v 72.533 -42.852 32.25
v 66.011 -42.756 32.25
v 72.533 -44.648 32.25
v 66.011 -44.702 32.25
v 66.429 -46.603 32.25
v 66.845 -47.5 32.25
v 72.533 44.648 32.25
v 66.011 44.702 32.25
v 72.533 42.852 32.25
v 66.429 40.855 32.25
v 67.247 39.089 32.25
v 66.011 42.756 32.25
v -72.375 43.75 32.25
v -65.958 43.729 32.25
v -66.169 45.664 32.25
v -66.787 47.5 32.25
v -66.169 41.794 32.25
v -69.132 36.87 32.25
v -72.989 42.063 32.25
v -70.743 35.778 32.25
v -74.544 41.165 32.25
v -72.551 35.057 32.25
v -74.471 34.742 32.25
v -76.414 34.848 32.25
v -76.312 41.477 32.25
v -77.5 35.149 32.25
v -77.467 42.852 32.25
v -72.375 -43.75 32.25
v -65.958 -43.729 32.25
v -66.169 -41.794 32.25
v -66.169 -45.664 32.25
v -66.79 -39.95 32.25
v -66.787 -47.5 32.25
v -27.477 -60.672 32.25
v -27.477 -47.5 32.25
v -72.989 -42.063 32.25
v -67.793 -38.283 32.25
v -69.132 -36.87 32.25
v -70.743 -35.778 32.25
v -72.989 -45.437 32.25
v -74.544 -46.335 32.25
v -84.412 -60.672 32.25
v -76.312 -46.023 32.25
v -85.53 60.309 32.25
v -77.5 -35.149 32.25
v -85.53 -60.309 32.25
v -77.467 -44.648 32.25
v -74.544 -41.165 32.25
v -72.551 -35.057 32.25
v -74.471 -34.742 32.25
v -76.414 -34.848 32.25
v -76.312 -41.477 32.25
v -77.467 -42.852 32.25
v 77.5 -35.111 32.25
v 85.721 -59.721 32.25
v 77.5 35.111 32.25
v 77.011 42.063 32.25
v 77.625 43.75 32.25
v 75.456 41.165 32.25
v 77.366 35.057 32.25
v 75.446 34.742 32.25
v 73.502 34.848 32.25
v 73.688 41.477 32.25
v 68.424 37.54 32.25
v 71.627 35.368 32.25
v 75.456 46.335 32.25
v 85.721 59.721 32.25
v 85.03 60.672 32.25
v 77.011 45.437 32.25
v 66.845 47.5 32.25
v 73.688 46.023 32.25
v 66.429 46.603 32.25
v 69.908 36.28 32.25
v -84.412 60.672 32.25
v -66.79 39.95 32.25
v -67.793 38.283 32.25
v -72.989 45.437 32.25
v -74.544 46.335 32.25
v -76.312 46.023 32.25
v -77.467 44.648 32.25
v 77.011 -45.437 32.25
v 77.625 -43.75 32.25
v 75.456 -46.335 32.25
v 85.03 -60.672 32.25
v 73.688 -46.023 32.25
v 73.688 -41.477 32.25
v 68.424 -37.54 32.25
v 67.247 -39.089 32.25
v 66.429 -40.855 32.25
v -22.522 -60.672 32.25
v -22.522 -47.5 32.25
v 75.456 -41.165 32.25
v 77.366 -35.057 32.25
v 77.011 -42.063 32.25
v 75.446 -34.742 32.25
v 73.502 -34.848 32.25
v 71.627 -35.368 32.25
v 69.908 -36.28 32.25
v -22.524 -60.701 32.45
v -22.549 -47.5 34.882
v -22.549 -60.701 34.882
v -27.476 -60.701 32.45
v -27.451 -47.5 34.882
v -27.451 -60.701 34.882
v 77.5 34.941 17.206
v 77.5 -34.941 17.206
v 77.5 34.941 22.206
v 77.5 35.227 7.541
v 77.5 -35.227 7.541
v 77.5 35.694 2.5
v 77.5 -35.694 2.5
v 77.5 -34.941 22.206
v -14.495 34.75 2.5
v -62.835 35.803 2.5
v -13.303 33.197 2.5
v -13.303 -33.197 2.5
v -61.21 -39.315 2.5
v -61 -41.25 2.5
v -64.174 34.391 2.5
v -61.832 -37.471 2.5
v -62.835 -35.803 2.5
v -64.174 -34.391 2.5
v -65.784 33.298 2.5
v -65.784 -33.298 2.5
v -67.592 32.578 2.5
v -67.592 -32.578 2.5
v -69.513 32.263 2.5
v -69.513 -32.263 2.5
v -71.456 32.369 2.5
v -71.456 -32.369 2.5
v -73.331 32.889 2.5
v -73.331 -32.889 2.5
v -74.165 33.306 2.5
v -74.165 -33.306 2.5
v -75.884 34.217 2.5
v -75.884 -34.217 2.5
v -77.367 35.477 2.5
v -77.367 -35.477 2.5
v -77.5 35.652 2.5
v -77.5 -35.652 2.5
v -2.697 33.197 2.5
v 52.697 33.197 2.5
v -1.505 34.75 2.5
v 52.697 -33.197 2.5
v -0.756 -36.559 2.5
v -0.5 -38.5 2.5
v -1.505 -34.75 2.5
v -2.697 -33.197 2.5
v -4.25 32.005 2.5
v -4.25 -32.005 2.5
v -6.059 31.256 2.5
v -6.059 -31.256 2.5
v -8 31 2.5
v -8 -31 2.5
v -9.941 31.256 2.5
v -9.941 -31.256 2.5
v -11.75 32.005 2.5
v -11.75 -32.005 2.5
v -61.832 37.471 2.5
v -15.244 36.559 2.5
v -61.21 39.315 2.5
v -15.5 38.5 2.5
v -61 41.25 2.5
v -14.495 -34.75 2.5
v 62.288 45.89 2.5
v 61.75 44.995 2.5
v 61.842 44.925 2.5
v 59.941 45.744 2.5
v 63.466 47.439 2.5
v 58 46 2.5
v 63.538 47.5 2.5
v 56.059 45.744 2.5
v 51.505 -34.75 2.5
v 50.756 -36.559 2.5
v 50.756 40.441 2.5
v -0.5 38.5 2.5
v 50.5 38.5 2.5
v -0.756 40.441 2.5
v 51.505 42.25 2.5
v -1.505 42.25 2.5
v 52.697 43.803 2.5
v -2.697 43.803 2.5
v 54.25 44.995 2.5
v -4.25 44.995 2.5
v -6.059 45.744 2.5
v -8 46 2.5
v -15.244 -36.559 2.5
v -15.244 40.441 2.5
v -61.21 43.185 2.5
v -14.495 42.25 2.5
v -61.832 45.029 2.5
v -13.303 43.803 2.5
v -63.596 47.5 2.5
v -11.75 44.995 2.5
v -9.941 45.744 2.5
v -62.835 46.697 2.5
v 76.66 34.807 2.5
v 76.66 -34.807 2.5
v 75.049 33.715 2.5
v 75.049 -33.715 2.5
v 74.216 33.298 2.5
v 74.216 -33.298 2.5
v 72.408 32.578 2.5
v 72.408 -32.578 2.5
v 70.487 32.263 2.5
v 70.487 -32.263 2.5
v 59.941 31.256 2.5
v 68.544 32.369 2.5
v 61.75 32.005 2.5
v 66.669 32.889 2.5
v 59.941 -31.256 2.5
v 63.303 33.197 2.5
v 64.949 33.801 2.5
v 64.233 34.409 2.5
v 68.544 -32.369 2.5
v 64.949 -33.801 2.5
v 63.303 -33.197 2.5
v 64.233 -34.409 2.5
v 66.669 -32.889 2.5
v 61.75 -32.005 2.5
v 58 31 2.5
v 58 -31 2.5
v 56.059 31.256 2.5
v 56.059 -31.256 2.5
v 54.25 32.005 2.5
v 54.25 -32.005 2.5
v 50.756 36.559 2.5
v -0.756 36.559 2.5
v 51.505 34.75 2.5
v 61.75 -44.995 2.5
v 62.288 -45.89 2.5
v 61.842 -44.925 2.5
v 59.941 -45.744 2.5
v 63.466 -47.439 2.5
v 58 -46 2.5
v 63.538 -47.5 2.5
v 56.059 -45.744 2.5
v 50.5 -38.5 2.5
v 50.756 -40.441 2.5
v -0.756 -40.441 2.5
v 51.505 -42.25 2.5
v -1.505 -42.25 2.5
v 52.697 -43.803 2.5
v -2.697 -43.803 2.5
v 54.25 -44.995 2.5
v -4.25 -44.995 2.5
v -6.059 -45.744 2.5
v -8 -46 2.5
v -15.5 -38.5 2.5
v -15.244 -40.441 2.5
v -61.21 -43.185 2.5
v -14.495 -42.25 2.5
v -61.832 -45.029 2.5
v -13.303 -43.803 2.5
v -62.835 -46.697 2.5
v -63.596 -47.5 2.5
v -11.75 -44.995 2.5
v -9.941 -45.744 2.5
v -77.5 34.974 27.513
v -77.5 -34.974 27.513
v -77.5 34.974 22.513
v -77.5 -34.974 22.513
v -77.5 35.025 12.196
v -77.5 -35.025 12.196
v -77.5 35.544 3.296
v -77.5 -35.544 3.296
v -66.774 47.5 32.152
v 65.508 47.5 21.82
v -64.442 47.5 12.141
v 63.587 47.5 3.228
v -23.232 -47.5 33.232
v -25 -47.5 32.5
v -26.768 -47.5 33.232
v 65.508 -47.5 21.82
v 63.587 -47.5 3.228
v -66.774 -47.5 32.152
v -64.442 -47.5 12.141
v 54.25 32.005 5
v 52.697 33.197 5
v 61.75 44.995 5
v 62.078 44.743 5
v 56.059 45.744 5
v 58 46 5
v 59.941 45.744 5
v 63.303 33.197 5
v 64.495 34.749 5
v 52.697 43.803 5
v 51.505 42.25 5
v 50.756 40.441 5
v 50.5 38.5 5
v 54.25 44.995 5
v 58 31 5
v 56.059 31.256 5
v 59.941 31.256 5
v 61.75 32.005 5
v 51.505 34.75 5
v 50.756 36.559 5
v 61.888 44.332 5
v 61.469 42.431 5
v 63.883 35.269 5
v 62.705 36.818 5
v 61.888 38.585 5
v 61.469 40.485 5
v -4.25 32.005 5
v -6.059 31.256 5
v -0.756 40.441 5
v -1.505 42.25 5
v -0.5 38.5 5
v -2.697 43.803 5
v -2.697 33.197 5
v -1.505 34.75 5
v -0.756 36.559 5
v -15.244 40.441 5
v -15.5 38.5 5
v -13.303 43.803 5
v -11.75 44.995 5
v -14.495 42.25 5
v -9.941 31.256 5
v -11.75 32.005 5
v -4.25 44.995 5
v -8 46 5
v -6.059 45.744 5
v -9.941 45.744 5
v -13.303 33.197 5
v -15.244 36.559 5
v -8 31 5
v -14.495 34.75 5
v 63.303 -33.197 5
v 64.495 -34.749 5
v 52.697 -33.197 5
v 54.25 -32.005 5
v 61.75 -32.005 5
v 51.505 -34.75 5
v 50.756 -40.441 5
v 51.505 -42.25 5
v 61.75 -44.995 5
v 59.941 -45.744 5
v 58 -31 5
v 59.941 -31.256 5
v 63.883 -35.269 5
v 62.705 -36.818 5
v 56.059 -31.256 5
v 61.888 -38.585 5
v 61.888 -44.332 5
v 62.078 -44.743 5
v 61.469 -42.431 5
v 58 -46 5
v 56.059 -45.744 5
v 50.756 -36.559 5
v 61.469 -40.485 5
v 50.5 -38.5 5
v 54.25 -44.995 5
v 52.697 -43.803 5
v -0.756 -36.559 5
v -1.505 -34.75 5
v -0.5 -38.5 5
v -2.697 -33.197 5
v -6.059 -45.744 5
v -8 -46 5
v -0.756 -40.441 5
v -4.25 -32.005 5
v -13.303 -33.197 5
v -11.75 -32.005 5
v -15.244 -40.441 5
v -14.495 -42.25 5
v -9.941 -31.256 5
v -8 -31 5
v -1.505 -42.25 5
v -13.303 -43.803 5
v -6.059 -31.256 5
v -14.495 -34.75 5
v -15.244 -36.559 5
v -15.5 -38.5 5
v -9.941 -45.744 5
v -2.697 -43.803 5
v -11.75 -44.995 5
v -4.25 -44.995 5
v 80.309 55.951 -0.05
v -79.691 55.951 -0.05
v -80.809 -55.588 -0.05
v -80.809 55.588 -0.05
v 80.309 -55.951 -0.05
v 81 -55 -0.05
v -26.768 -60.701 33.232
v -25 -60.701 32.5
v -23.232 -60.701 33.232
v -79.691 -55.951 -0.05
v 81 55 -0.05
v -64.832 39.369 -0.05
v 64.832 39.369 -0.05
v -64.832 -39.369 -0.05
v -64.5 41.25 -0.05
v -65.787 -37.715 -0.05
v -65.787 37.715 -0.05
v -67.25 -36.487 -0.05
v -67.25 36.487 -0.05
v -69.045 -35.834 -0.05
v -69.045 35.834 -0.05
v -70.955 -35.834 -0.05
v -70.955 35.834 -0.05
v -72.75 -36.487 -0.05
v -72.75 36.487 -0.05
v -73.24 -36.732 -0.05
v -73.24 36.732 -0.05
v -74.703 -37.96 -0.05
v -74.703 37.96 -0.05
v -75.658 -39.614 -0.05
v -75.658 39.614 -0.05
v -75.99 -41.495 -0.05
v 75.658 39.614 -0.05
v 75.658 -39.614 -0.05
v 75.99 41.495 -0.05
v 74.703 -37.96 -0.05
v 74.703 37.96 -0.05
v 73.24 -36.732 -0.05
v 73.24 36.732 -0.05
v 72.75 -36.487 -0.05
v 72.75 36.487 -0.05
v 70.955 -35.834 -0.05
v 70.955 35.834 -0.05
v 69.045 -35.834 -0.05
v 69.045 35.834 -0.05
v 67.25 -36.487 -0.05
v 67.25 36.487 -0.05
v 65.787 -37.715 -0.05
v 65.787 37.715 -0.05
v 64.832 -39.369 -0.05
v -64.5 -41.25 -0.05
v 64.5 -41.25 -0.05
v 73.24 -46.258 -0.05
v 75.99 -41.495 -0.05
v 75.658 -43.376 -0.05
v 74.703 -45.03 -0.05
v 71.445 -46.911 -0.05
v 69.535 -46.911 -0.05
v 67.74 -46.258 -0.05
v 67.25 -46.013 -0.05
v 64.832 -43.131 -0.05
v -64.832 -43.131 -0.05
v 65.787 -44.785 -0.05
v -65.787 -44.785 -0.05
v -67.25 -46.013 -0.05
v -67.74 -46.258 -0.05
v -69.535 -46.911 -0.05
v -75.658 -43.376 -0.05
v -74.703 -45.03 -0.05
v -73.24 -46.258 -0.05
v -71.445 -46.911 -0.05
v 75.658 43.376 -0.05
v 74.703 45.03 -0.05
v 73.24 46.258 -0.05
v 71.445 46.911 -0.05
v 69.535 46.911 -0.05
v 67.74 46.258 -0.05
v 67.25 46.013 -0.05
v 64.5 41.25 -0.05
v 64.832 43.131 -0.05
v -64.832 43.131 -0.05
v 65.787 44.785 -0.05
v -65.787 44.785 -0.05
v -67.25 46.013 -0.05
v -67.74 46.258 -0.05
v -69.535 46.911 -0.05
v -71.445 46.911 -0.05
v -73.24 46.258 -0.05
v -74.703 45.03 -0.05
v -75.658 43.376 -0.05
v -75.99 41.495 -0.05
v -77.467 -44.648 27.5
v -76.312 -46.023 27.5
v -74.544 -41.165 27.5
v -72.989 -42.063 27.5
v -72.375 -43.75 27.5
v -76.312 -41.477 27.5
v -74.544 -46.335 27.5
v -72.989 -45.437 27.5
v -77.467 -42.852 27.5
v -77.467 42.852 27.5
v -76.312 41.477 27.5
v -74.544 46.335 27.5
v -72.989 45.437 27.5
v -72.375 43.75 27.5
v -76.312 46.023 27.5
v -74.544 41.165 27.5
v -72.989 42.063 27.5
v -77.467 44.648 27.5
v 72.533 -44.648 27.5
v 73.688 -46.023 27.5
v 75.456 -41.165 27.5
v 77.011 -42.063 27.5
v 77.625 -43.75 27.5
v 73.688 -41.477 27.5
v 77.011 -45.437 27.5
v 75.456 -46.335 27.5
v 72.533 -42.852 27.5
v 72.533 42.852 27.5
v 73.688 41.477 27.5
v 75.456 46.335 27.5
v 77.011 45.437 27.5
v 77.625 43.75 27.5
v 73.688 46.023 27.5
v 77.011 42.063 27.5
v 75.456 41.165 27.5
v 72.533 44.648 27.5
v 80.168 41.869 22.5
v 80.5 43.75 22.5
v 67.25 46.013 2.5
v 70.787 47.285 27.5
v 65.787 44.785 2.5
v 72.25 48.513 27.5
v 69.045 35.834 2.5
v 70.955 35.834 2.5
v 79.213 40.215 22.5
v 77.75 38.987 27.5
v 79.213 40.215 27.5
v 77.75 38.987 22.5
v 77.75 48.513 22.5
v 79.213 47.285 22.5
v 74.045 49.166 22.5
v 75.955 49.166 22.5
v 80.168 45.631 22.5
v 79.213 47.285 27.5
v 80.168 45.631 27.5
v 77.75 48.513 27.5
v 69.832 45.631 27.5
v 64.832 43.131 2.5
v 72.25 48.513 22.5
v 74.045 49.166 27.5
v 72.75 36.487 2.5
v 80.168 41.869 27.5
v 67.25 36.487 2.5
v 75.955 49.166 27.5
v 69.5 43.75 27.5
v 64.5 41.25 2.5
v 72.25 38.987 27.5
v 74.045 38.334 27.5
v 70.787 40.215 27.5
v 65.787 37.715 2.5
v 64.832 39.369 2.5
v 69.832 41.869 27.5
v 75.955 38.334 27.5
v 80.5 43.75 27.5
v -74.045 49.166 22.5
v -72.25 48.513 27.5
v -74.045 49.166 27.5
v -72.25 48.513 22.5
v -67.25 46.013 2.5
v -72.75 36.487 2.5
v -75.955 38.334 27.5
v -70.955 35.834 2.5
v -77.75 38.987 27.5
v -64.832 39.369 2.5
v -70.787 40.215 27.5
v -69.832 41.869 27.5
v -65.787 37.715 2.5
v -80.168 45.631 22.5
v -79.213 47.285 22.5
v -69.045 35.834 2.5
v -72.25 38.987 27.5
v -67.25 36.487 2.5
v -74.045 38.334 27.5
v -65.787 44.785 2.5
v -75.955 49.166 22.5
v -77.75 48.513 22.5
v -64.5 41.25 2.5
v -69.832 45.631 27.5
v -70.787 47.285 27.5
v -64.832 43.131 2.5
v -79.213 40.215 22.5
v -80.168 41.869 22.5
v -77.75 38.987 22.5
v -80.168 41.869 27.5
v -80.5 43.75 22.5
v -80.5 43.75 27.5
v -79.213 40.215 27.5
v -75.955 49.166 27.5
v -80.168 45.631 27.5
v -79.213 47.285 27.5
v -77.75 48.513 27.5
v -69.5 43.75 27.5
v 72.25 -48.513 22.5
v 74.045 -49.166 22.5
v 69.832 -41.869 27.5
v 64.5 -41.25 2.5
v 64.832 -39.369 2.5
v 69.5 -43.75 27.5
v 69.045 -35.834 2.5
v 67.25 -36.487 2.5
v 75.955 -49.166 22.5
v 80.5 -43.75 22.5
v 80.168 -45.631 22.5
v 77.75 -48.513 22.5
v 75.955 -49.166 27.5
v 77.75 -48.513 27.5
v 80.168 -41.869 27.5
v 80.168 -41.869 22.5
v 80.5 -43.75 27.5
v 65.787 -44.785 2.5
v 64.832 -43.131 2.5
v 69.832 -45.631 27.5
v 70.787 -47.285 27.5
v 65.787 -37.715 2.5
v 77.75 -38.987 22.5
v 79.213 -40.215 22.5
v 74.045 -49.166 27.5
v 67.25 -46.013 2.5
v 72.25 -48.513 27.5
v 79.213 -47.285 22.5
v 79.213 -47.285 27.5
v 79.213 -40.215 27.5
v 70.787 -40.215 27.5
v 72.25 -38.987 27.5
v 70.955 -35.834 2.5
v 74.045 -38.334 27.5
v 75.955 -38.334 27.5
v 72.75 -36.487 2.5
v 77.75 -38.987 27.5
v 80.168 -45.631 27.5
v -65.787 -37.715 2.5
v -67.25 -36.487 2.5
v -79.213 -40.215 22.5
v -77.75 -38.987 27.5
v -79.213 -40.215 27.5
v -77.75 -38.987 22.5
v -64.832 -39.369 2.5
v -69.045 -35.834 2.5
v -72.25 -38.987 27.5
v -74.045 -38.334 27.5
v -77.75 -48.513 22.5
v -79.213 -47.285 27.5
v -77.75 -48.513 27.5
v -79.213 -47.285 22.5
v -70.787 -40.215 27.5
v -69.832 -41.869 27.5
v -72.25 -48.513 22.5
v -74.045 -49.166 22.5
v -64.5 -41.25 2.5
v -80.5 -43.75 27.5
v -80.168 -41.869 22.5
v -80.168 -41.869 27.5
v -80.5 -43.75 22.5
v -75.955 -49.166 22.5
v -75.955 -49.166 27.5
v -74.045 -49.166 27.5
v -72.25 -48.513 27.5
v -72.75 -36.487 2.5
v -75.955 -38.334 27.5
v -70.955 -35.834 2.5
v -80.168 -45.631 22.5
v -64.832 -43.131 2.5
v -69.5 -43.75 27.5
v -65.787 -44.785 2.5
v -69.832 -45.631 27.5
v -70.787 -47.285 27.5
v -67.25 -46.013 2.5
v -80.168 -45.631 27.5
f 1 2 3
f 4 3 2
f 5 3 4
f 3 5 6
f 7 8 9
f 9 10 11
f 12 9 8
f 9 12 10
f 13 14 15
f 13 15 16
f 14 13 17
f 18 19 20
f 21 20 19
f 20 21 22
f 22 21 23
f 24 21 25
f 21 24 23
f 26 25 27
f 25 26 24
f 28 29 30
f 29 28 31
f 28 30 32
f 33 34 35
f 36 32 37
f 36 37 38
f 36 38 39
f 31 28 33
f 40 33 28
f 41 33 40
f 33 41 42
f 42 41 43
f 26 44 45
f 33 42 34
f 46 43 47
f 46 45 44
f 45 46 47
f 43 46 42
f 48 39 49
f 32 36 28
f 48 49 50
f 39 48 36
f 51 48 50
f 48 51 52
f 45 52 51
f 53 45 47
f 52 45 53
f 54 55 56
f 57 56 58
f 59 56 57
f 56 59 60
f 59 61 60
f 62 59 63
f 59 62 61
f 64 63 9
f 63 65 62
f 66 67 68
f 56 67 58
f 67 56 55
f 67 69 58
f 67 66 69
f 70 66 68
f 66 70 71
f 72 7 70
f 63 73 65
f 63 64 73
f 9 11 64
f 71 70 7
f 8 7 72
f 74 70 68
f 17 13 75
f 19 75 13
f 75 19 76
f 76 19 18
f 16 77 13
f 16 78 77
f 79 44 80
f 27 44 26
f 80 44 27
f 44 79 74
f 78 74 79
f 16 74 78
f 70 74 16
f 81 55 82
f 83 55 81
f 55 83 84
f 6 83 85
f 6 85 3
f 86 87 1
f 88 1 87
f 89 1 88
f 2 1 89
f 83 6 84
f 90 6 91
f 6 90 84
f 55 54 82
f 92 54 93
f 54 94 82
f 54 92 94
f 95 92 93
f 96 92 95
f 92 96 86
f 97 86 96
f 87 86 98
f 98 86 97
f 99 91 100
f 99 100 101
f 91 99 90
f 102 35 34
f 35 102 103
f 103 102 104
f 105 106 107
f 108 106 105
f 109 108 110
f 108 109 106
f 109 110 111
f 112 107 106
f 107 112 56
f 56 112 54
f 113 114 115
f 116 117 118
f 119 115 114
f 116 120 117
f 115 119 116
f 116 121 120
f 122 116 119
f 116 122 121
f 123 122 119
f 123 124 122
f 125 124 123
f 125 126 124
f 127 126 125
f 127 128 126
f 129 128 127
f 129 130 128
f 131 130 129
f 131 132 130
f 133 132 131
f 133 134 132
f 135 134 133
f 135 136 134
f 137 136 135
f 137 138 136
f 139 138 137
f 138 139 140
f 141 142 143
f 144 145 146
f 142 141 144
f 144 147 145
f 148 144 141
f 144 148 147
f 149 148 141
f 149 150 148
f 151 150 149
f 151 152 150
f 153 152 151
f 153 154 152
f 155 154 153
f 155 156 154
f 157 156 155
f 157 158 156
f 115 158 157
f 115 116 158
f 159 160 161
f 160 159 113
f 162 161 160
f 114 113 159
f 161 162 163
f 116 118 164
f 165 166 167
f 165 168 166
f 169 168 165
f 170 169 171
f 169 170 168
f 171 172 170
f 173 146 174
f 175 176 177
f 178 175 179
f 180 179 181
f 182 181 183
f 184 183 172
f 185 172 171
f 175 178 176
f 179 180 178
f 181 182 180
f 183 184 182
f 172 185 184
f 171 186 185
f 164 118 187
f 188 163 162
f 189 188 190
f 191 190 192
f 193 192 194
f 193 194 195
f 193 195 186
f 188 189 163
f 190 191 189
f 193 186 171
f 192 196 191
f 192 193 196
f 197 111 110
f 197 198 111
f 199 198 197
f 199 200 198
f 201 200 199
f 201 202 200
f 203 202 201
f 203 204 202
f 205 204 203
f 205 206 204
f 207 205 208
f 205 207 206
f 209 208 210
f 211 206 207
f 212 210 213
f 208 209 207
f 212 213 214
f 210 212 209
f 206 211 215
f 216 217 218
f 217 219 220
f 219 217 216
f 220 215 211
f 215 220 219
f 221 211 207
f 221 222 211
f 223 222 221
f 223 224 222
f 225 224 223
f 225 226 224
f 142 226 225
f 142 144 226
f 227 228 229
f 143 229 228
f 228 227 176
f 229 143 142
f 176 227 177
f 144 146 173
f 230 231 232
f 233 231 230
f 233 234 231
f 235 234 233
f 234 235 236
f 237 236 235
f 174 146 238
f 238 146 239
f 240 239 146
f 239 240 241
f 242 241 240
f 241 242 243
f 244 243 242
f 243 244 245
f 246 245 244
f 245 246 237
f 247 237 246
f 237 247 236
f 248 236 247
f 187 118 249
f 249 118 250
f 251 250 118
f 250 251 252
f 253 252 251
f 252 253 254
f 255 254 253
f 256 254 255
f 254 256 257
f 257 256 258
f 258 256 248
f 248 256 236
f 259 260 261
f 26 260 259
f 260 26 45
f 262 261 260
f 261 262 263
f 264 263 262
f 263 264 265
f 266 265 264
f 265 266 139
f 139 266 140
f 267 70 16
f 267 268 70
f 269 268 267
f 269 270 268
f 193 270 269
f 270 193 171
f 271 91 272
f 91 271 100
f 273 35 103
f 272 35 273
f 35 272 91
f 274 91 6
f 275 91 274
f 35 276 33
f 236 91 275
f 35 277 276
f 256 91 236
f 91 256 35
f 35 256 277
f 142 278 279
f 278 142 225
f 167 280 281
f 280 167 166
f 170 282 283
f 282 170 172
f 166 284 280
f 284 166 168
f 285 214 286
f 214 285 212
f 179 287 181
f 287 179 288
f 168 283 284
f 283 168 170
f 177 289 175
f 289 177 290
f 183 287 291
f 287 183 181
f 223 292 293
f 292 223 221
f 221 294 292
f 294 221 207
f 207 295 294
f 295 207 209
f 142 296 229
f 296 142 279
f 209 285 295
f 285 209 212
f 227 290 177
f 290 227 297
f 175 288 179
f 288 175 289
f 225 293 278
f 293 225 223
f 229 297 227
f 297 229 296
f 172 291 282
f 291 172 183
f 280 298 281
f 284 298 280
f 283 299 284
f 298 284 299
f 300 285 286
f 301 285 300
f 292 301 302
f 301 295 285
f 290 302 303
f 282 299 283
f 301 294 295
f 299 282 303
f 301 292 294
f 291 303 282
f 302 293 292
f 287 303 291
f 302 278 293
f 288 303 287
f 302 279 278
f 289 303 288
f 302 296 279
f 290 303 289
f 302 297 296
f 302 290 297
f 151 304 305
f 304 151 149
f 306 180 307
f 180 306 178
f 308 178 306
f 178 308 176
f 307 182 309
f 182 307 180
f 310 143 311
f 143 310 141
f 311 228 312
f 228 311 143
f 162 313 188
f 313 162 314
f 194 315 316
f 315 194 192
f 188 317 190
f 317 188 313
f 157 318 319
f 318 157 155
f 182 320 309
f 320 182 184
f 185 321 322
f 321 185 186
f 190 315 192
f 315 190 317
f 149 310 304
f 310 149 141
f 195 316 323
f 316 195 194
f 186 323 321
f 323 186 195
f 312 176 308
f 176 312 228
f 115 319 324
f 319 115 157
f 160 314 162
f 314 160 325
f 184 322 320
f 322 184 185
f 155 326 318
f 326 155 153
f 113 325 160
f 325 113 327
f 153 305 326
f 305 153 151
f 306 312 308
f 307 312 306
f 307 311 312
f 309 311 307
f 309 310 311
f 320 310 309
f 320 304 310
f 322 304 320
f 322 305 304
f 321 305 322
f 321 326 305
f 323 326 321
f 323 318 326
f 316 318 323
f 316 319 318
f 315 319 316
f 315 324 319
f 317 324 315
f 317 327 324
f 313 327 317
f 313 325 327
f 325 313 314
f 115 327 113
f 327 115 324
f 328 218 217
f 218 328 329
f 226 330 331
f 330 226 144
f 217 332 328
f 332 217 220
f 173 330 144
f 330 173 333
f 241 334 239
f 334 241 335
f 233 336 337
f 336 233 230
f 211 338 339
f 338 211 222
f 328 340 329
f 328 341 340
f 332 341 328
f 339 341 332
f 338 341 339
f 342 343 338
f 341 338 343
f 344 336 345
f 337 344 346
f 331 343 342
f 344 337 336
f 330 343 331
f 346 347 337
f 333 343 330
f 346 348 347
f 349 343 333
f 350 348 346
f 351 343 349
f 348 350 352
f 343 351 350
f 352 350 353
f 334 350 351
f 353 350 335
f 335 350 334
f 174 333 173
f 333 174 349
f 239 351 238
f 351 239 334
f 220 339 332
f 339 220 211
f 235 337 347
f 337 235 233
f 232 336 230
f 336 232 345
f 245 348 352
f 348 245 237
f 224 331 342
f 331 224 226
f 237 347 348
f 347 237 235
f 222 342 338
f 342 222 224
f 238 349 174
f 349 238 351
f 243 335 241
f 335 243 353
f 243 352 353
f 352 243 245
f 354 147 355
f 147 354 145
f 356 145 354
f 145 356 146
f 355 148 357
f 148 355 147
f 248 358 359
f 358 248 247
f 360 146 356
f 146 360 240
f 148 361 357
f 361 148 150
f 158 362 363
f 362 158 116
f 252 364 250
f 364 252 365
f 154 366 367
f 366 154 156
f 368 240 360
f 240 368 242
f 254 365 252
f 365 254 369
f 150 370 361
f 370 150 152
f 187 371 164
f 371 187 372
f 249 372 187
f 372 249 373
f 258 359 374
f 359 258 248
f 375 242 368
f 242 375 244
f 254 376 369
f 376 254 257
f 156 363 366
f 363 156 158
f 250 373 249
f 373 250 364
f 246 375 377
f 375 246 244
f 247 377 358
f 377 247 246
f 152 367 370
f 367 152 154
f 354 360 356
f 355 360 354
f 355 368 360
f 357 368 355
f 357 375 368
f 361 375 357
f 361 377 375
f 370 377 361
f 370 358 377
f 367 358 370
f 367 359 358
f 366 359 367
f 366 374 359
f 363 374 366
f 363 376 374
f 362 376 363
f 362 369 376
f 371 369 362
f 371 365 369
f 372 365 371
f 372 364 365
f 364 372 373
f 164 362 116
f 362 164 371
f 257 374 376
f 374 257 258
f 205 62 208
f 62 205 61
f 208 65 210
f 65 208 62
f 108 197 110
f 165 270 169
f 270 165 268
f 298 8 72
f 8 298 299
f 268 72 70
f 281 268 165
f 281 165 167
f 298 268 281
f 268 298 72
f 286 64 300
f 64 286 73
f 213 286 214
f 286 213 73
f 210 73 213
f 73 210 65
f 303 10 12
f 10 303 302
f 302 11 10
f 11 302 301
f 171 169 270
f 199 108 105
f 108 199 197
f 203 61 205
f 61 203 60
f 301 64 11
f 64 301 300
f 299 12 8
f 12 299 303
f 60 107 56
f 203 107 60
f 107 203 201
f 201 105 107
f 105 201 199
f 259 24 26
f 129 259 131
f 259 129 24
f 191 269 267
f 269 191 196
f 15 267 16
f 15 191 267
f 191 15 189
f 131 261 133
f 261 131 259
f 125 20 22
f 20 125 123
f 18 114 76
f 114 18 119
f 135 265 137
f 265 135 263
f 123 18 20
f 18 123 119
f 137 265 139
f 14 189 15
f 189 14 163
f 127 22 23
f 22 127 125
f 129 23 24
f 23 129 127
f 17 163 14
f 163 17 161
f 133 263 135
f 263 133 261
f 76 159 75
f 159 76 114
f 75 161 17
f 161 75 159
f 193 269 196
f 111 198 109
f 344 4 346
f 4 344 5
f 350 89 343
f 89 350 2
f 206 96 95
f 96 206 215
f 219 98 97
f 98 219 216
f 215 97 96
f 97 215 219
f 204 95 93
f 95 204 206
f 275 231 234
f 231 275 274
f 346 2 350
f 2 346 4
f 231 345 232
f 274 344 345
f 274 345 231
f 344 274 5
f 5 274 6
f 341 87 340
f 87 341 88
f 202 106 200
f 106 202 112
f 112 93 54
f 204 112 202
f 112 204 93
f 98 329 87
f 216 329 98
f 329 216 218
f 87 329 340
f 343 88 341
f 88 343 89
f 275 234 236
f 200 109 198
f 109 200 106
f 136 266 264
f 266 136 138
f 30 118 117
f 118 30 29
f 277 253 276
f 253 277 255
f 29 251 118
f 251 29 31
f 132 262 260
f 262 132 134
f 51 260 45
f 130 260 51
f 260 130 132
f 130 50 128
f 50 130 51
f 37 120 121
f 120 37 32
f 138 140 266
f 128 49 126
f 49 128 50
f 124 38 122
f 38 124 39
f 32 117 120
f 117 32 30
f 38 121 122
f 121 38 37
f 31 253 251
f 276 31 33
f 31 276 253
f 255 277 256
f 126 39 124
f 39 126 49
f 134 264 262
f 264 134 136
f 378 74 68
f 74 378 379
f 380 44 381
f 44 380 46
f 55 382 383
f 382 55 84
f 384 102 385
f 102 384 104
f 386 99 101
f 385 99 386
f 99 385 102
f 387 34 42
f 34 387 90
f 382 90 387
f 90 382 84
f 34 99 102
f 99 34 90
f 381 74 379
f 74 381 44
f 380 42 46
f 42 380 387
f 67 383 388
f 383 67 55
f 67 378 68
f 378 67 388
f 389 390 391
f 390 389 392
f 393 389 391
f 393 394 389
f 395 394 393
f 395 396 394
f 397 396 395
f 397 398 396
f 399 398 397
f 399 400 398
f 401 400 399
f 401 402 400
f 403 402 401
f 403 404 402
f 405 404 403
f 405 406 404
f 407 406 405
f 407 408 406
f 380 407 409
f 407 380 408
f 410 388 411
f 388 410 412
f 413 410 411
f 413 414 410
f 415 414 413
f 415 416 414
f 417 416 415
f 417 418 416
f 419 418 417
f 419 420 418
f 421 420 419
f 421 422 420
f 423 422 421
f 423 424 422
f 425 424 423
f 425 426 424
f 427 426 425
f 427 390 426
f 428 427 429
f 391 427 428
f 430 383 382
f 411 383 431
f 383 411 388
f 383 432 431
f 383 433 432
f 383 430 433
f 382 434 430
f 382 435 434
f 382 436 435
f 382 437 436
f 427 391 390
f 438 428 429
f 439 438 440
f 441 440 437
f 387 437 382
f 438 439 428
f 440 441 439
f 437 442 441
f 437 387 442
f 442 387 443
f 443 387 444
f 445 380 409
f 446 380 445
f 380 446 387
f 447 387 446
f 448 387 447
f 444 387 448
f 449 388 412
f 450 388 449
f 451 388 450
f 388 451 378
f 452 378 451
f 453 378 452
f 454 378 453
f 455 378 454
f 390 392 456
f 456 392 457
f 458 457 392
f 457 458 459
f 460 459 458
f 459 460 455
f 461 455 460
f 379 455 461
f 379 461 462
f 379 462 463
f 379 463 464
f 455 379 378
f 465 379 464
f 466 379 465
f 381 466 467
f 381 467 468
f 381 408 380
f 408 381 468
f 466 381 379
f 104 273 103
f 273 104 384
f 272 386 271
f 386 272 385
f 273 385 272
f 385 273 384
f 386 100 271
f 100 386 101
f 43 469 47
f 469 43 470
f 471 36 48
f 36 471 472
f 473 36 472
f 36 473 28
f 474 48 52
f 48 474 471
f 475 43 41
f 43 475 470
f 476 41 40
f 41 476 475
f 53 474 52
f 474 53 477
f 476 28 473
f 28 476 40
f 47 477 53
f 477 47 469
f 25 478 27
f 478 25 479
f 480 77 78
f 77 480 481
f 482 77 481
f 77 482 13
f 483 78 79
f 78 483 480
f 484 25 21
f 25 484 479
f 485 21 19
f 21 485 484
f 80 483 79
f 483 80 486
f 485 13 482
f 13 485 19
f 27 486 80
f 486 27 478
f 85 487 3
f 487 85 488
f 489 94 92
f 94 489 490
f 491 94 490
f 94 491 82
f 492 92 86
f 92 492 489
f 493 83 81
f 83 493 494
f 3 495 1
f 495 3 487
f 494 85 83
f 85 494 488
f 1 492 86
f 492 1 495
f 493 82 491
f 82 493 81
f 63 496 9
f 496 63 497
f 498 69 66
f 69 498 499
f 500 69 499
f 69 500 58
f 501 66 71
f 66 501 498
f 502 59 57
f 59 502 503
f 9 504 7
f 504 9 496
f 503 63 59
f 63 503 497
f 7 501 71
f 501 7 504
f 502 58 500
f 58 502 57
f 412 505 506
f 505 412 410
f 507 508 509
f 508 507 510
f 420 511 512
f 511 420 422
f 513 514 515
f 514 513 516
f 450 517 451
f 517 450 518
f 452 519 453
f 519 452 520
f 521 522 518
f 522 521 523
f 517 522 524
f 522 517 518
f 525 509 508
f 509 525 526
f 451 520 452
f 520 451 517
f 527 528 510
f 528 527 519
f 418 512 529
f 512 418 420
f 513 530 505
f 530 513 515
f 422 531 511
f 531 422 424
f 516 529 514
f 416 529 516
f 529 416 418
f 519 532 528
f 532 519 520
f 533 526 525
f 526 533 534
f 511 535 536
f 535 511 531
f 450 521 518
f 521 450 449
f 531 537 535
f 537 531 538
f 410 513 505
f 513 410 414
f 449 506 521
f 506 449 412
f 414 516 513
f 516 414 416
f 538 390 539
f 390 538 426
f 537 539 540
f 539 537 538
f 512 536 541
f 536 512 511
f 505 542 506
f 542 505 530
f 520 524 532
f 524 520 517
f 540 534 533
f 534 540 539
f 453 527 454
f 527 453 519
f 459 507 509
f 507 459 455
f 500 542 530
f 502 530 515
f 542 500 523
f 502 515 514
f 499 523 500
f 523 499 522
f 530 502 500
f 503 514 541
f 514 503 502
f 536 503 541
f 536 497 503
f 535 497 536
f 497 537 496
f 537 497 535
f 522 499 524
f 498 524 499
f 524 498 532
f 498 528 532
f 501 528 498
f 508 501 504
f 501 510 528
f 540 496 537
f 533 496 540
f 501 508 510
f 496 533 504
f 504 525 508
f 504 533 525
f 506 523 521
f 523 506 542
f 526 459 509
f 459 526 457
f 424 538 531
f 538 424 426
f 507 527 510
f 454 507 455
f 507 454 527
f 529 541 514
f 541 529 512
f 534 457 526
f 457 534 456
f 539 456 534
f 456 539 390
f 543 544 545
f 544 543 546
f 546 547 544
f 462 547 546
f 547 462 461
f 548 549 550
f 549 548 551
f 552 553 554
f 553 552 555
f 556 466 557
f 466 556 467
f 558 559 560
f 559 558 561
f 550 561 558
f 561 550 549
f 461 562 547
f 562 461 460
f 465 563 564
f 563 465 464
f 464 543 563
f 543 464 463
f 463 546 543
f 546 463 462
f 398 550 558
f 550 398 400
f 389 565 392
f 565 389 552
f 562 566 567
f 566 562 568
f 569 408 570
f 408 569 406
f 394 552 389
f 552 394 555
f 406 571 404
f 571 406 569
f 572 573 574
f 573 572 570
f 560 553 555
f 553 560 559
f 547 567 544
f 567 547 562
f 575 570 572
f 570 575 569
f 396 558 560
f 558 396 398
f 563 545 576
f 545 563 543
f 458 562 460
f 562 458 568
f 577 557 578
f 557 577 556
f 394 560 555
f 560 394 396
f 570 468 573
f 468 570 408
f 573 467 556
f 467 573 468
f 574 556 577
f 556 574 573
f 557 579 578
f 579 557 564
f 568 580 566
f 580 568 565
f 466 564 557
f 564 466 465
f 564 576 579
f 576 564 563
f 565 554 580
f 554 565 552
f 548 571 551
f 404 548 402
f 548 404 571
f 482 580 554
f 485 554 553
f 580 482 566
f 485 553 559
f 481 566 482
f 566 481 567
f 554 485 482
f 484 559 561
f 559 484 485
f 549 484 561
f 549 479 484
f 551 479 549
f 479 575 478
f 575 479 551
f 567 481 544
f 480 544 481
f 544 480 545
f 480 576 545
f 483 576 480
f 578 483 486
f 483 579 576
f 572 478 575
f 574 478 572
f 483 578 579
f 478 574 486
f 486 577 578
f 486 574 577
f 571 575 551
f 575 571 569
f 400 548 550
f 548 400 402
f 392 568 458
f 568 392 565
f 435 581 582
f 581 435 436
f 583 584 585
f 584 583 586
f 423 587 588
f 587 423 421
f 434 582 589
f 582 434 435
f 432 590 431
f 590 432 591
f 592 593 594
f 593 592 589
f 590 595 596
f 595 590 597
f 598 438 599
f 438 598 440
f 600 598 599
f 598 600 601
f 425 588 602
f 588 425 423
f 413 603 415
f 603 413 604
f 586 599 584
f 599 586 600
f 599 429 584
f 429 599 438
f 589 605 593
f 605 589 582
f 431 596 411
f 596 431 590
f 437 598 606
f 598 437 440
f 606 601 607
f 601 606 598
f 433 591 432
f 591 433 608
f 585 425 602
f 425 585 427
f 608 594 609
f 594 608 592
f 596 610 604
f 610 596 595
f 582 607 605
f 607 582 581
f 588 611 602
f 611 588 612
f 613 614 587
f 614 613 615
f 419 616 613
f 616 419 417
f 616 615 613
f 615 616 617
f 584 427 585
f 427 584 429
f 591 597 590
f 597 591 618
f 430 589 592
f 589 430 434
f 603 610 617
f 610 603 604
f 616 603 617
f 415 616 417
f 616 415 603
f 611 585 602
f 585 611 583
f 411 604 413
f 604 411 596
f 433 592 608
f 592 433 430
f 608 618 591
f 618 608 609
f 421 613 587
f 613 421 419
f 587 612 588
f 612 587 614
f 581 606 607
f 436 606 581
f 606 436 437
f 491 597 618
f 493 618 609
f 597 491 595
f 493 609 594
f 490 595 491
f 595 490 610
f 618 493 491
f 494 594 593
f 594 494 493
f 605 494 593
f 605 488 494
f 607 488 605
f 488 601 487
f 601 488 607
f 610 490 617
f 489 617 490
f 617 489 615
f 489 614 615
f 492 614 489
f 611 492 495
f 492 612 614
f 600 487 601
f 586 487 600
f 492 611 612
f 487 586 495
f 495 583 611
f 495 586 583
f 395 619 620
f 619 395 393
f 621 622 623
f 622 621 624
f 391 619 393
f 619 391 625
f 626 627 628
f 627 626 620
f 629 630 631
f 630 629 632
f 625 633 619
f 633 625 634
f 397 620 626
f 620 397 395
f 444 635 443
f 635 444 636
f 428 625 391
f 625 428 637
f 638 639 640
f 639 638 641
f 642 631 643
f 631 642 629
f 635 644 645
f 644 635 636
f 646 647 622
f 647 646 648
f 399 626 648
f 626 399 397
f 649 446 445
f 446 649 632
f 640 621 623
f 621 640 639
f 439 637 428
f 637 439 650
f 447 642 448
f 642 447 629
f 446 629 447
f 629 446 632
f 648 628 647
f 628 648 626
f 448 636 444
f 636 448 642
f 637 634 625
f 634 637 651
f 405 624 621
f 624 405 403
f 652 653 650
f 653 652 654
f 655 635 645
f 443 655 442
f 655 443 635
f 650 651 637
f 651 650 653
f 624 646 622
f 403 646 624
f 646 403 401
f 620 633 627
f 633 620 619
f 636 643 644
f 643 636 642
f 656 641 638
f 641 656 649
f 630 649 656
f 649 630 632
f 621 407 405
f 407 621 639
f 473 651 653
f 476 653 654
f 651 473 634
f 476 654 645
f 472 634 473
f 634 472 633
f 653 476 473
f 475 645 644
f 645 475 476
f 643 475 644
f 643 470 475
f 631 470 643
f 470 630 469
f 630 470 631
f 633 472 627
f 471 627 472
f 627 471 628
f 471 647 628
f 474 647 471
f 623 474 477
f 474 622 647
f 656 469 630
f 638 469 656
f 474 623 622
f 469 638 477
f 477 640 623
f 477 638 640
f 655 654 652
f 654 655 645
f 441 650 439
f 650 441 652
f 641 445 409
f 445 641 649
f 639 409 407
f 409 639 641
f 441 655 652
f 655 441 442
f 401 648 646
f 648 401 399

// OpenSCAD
// Bottom
difference() {
    minkowski() {
        hull() {
            translate([0, 0, 30])
                cube([160, 110, 60], center=true);
            translate([0, 0, 40])
                cube([169.5, 119.5, 15], center=true);
            
        }
        cylinder(d=2, h=0.1, center=true);
    }
    
    // Slice off the top, but leave the cable retention nub
    difference() {
        translate([0, 0, 62.25])
            cube([200, 150, 60], center=true);

        hull() {
        translate([-25, -50, 35])
            rotate([90,0,0])
            cylinder(d=4.9, h=50, center=true);

        translate([-25, -50, 30])
            rotate([90,0,0])
            cylinder(d=5, h=50, center=true);
        }
    }

    // Cable
    translate([-25, -50, 35])
        rotate([90,0,0])
        cylinder(d=5, h=50, center=true);

    // Optional through-pegs for the Joystick screws.
    /*
    translate([66/2+25, 77/2, 0])
        cylinder(d=11, h=6, center=true);
    translate([-66/2+25, 77/2, 0])
        cylinder(d=11, h=6, center=true);
    translate([66/2+25, -77/2, 0])
        cylinder(d=11, h=6, center=true);
    translate([-66/2+25, -77/2, 0])
        cylinder(d=11, h=6, center=true);

    translate([66/2+25, 77/2, 30])
        cylinder(d=5.25, h=65, center=true);
    translate([-66/2+25, 77/2, 30])
        cylinder(d=5.25, h=65, center=true);
    translate([66/2+25, -77/2, 30])
        cylinder(d=5.25, h=65, center=true);
    translate([-66/2+25, -77/2, 30])
        cylinder(d=5.25, h=65, center=true);
    */

    // Case mounting holes
    translate([-75, -87.5/2, 30])
        cylinder(d=5.25, h=15, center=true);
    translate([-75, 87.5/2, 30])
        cylinder(d=5.25, h=15, center=true);
    translate([75, -87.5/2, 30])
        cylinder(d=5.25, h=15, center=true);
    translate([75, 87.5/2, 30])
        cylinder(d=5.25, h=15, center=true);

    // Tapered channels for case screws
    hull() {
        translate([70, 82.5/2, 0])
            cylinder(d=11, h=5, center=true);
        translate([75, 87.5/2, 25])
            cylinder(d=11, h=5, center=true);
    }
    hull() {
        translate([-70, 82.5/2, 0])
            cylinder(d=11, h=5, center=true);
        translate([-75, 87.5/2, 25])
            cylinder(d=11, h=5, center=true);
    }
    hull() {
        translate([70, -82.5/2, 0])
            cylinder(d=11, h=5, center=true);
        translate([75, -87.5/2, 25])
            cylinder(d=11, h=5, center=true);
    }
    hull() {
        translate([-70, -82.5/2, 0])
            cylinder(d=11, h=5, center=true);
        translate([-75, -87.5/2, 25])
            cylinder(d=11, h=5, center=true);
    }

    // Hollowed out void of the Joystick's heart
    difference() {
        translate([0, 0, 32.5])
            cube([155, 95, 60], center=true);

        translate([66/2+25, 77/2, 0])
            cylinder(d=15, h=10, center=true);
        translate([-66/2+25, 77/2, 0])
            cylinder(d=15, h=10, center=true);
        translate([66/2+25, -77/2, 0])
            cylinder(d=15, h=10, center=true);
        translate([-66/2+25, -77/2, 0])
            cylinder(d=15, h=10, center=true);

        hull() {
            translate([70, 82.5/2, 0])
                cylinder(d=18, h=5, center=true);
            translate([75, 87.5/2, 30])
                cylinder(d=18, h=5, center=true);
        }

        hull() {
            translate([-70, 82.5/2, 0])
                cylinder(d=18, h=5, center=true);
            translate([-75, 87.5/2, 30])
                cylinder(d=18, h=5, center=true);
        }

        hull() {
            translate([70, -82.5/2, 0])
                cylinder(d=18, h=5, center=true);
            translate([75, -87.5/2, 30])
                cylinder(d=18, h=5, center=true);
        }

        hull() {
            translate([-70, -82.5/2, 0])
                cylinder(d=18, h=5, center=true);
            translate([-75, -87.5/2, 30])
                cylinder(d=18, h=5, center=true);
        }

    }
}
